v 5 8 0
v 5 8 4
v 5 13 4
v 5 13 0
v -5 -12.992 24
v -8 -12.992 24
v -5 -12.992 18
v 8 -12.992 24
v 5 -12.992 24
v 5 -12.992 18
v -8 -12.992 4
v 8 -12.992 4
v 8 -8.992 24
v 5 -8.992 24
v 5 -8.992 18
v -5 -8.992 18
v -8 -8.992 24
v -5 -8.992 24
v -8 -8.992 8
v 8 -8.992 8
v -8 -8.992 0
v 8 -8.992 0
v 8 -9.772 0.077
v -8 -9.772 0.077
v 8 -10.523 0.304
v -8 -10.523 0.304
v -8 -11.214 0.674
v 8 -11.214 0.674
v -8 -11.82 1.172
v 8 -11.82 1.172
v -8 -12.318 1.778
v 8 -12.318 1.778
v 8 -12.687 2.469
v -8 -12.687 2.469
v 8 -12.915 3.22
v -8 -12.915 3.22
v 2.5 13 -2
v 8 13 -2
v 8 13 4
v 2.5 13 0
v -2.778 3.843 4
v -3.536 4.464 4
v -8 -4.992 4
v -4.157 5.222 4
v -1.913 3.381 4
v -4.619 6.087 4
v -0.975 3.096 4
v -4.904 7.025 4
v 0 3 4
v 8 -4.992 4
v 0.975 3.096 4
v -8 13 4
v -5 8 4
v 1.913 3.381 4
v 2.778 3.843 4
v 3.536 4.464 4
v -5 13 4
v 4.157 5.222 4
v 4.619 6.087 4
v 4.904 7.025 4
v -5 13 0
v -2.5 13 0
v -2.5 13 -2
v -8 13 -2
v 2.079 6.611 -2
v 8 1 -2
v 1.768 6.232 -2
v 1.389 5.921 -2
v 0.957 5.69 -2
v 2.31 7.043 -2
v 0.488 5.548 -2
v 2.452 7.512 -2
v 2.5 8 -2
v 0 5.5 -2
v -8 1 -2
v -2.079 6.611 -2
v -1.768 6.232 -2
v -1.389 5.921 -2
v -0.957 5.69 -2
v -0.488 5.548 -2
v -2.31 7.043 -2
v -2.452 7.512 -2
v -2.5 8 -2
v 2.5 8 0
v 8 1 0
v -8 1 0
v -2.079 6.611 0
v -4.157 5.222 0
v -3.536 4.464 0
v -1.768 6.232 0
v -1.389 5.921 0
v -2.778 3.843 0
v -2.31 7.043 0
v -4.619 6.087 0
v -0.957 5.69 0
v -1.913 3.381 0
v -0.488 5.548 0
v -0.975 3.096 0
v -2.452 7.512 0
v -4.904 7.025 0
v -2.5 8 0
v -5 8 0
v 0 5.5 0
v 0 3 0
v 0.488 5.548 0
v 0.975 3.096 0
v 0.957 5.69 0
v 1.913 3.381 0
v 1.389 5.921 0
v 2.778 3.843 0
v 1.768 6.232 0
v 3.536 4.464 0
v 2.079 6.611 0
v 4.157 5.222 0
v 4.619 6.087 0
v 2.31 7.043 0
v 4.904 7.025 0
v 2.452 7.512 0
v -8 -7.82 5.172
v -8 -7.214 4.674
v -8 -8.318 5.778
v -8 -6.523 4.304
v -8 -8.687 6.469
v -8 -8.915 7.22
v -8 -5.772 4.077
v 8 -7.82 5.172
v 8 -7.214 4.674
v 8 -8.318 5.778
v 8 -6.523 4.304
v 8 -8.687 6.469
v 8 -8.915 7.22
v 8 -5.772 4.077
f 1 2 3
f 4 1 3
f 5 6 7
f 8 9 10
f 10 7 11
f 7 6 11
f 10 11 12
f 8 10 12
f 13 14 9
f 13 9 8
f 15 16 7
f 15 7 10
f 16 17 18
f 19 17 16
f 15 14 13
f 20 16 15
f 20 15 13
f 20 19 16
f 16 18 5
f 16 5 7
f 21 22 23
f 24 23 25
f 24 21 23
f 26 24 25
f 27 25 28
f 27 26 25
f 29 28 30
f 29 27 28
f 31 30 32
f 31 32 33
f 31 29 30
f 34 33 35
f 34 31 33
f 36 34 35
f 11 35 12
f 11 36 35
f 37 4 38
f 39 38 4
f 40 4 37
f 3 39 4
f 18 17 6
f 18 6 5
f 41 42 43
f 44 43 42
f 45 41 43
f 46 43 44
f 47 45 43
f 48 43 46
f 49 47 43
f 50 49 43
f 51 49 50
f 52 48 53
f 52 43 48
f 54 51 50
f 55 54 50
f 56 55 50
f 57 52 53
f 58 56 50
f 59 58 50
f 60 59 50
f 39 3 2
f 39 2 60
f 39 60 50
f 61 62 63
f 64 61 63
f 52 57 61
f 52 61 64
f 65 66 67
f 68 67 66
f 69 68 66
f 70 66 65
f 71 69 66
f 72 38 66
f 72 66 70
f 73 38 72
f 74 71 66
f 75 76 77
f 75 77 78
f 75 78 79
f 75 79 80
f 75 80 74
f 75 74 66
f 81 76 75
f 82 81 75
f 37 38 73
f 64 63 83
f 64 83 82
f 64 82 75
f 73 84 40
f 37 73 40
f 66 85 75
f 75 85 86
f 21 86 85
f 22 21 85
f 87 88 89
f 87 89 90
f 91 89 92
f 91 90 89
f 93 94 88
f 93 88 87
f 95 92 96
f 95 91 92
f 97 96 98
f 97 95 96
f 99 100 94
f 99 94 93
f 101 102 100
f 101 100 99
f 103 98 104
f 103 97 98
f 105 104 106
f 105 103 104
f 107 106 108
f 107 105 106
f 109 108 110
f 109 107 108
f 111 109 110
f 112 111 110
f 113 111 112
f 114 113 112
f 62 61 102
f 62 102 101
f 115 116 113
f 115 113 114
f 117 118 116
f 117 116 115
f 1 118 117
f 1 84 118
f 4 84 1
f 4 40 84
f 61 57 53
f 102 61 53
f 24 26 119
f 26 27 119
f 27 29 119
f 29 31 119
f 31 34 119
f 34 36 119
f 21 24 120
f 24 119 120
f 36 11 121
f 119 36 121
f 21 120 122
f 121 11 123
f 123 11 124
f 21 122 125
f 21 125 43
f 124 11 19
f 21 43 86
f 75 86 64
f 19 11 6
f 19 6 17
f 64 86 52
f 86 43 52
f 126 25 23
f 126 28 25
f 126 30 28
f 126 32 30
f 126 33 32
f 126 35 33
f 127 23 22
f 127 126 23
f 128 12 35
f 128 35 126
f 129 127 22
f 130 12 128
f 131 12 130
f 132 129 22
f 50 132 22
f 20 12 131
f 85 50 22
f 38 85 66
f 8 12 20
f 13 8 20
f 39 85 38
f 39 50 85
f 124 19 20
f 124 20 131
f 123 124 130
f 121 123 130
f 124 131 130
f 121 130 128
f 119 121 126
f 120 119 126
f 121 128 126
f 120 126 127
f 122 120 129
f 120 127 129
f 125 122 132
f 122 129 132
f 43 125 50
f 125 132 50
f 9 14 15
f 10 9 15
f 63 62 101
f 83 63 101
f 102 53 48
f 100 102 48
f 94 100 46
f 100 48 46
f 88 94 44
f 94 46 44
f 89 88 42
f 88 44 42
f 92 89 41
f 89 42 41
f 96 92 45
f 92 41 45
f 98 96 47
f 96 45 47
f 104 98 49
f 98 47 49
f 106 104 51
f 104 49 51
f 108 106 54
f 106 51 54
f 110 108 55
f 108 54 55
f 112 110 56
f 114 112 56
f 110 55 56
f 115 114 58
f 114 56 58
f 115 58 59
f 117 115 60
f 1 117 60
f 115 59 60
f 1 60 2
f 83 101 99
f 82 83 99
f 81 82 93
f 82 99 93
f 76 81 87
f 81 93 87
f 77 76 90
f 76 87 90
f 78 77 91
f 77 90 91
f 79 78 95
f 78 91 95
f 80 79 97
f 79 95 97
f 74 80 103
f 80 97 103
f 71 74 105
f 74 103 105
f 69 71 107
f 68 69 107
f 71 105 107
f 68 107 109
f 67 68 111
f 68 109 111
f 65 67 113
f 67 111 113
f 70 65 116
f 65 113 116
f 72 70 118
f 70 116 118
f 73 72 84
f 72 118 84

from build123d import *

# Parameters (mm, degrees)
SKETCH_1_W          = 16
SKETCH_1_H          = 26
EXTRUDE_1_DEPTH     = 4
SKETCH_2_W          = 16
SKETCH_2_H          = 4
EXTRUDE_2_DEPTH     = 20
SKETCH_3_W          = 16
SKETCH_3_H          = 12
EXTRUDE_3_DEPTH     = 2
FILLET_2_R          = 4
FILLET_START        = -8
FILLET_3_DEPTH      = 16
SKETCH_4_W          = 10
SKETCH_4_H          = 6
CUT_EXTRUDE_2_DEPTH = 34.520714063
CUT_EXTRUDE_3_DEPTH = 4
CUT_EXTRUDE_4_DEPTH = 2


with BuildPart() as part:
    # Эскиз1 → Бобышка-Вытянуть1 (new body)
    with BuildSketch(Plane.XY):
        Rectangle(SKETCH_1_W, SKETCH_1_H)
    extrude(amount=EXTRUDE_1_DEPTH)

    # Эскиз2 → Бобышка-Вытянуть2 (add)
    with BuildSketch(Plane.XY.offset(4)):
        with Locations((0, -10.991777356)):
            Rectangle(SKETCH_2_W, SKETCH_2_H)
    extrude(amount=EXTRUDE_2_DEPTH)

    # Эскиз3 → Бобышка-Вытянуть3 (add)
    with BuildSketch(Plane(origin=(0, 0, 0), x_dir=(-1, 0, 0), z_dir=(0, 0, -1))):
        with Locations((0, 7)):
            Rectangle(SKETCH_3_W, SKETCH_3_H)
    extrude(amount=EXTRUDE_3_DEPTH)

    # Скругление2
    fillet_2_edges = [part.edges().sort_by_distance(p)[0] for p in [
        (0, -8.991777356, 4),
    ]]
    fillet(fillet_2_edges, radius=FILLET_2_R)

    # Скругление3: read off the stored shape, not the designer's step
    # Скругление3 outline → Скругление3 (cut)
    with BuildSketch(Plane.YZ.offset(FILLET_START)):
        with BuildLine():
            ThreePointArc((-8.991777356, 0), (-11.820204481, 1.171572875), (-12.991777356, 4))
            Line((-12.991777356, 4), (-13, 4))
            Line((-13, 4), (-13, 0))
            Line((-13, 0), (-8.991777356, 0))
        make_face()
    extrude(amount=FILLET_3_DEPTH, mode=Mode.SUBTRACT)

    # Эскиз4 → Вырез-Вытянуть2 (cut, through all)
    with BuildSketch(Plane(origin=(0, -8.991777356, 0), x_dir=(1, 0, 0), z_dir=(0, 1, 0))):
        with Locations((0, -21)):
            Rectangle(SKETCH_4_W, SKETCH_4_H)
    extrude(amount=-CUT_EXTRUDE_2_DEPTH, mode=Mode.SUBTRACT)

    # Эскиз5 → Вырез-Вытянуть3 (cut)
    with BuildSketch(Plane.XY.offset(4)):
        with BuildLine():
            Line((-5, 13), (-5, 8))
            ThreePointArc((-5, 8), (0, 3), (5, 8))
            Line((5, 8), (5, 13))
            Line((5, 13), (-5, 13))
        make_face()
    extrude(amount=-CUT_EXTRUDE_3_DEPTH, mode=Mode.SUBTRACT)

    # Эскиз7 → Вырез-Вытянуть4 (cut)
    with BuildSketch(Plane.XY):
        with BuildLine():
            Line((-2.5, 13), (-2.5, 8))
            ThreePointArc((-2.5, 8), (0, 5.5), (2.5, 8))
            Line((2.5, 8), (2.5, 13))
            Line((2.5, 13), (-2.5, 13))
        make_face()
    extrude(amount=-CUT_EXTRUDE_4_DEPTH, mode=Mode.SUBTRACT)


solid = part.part
